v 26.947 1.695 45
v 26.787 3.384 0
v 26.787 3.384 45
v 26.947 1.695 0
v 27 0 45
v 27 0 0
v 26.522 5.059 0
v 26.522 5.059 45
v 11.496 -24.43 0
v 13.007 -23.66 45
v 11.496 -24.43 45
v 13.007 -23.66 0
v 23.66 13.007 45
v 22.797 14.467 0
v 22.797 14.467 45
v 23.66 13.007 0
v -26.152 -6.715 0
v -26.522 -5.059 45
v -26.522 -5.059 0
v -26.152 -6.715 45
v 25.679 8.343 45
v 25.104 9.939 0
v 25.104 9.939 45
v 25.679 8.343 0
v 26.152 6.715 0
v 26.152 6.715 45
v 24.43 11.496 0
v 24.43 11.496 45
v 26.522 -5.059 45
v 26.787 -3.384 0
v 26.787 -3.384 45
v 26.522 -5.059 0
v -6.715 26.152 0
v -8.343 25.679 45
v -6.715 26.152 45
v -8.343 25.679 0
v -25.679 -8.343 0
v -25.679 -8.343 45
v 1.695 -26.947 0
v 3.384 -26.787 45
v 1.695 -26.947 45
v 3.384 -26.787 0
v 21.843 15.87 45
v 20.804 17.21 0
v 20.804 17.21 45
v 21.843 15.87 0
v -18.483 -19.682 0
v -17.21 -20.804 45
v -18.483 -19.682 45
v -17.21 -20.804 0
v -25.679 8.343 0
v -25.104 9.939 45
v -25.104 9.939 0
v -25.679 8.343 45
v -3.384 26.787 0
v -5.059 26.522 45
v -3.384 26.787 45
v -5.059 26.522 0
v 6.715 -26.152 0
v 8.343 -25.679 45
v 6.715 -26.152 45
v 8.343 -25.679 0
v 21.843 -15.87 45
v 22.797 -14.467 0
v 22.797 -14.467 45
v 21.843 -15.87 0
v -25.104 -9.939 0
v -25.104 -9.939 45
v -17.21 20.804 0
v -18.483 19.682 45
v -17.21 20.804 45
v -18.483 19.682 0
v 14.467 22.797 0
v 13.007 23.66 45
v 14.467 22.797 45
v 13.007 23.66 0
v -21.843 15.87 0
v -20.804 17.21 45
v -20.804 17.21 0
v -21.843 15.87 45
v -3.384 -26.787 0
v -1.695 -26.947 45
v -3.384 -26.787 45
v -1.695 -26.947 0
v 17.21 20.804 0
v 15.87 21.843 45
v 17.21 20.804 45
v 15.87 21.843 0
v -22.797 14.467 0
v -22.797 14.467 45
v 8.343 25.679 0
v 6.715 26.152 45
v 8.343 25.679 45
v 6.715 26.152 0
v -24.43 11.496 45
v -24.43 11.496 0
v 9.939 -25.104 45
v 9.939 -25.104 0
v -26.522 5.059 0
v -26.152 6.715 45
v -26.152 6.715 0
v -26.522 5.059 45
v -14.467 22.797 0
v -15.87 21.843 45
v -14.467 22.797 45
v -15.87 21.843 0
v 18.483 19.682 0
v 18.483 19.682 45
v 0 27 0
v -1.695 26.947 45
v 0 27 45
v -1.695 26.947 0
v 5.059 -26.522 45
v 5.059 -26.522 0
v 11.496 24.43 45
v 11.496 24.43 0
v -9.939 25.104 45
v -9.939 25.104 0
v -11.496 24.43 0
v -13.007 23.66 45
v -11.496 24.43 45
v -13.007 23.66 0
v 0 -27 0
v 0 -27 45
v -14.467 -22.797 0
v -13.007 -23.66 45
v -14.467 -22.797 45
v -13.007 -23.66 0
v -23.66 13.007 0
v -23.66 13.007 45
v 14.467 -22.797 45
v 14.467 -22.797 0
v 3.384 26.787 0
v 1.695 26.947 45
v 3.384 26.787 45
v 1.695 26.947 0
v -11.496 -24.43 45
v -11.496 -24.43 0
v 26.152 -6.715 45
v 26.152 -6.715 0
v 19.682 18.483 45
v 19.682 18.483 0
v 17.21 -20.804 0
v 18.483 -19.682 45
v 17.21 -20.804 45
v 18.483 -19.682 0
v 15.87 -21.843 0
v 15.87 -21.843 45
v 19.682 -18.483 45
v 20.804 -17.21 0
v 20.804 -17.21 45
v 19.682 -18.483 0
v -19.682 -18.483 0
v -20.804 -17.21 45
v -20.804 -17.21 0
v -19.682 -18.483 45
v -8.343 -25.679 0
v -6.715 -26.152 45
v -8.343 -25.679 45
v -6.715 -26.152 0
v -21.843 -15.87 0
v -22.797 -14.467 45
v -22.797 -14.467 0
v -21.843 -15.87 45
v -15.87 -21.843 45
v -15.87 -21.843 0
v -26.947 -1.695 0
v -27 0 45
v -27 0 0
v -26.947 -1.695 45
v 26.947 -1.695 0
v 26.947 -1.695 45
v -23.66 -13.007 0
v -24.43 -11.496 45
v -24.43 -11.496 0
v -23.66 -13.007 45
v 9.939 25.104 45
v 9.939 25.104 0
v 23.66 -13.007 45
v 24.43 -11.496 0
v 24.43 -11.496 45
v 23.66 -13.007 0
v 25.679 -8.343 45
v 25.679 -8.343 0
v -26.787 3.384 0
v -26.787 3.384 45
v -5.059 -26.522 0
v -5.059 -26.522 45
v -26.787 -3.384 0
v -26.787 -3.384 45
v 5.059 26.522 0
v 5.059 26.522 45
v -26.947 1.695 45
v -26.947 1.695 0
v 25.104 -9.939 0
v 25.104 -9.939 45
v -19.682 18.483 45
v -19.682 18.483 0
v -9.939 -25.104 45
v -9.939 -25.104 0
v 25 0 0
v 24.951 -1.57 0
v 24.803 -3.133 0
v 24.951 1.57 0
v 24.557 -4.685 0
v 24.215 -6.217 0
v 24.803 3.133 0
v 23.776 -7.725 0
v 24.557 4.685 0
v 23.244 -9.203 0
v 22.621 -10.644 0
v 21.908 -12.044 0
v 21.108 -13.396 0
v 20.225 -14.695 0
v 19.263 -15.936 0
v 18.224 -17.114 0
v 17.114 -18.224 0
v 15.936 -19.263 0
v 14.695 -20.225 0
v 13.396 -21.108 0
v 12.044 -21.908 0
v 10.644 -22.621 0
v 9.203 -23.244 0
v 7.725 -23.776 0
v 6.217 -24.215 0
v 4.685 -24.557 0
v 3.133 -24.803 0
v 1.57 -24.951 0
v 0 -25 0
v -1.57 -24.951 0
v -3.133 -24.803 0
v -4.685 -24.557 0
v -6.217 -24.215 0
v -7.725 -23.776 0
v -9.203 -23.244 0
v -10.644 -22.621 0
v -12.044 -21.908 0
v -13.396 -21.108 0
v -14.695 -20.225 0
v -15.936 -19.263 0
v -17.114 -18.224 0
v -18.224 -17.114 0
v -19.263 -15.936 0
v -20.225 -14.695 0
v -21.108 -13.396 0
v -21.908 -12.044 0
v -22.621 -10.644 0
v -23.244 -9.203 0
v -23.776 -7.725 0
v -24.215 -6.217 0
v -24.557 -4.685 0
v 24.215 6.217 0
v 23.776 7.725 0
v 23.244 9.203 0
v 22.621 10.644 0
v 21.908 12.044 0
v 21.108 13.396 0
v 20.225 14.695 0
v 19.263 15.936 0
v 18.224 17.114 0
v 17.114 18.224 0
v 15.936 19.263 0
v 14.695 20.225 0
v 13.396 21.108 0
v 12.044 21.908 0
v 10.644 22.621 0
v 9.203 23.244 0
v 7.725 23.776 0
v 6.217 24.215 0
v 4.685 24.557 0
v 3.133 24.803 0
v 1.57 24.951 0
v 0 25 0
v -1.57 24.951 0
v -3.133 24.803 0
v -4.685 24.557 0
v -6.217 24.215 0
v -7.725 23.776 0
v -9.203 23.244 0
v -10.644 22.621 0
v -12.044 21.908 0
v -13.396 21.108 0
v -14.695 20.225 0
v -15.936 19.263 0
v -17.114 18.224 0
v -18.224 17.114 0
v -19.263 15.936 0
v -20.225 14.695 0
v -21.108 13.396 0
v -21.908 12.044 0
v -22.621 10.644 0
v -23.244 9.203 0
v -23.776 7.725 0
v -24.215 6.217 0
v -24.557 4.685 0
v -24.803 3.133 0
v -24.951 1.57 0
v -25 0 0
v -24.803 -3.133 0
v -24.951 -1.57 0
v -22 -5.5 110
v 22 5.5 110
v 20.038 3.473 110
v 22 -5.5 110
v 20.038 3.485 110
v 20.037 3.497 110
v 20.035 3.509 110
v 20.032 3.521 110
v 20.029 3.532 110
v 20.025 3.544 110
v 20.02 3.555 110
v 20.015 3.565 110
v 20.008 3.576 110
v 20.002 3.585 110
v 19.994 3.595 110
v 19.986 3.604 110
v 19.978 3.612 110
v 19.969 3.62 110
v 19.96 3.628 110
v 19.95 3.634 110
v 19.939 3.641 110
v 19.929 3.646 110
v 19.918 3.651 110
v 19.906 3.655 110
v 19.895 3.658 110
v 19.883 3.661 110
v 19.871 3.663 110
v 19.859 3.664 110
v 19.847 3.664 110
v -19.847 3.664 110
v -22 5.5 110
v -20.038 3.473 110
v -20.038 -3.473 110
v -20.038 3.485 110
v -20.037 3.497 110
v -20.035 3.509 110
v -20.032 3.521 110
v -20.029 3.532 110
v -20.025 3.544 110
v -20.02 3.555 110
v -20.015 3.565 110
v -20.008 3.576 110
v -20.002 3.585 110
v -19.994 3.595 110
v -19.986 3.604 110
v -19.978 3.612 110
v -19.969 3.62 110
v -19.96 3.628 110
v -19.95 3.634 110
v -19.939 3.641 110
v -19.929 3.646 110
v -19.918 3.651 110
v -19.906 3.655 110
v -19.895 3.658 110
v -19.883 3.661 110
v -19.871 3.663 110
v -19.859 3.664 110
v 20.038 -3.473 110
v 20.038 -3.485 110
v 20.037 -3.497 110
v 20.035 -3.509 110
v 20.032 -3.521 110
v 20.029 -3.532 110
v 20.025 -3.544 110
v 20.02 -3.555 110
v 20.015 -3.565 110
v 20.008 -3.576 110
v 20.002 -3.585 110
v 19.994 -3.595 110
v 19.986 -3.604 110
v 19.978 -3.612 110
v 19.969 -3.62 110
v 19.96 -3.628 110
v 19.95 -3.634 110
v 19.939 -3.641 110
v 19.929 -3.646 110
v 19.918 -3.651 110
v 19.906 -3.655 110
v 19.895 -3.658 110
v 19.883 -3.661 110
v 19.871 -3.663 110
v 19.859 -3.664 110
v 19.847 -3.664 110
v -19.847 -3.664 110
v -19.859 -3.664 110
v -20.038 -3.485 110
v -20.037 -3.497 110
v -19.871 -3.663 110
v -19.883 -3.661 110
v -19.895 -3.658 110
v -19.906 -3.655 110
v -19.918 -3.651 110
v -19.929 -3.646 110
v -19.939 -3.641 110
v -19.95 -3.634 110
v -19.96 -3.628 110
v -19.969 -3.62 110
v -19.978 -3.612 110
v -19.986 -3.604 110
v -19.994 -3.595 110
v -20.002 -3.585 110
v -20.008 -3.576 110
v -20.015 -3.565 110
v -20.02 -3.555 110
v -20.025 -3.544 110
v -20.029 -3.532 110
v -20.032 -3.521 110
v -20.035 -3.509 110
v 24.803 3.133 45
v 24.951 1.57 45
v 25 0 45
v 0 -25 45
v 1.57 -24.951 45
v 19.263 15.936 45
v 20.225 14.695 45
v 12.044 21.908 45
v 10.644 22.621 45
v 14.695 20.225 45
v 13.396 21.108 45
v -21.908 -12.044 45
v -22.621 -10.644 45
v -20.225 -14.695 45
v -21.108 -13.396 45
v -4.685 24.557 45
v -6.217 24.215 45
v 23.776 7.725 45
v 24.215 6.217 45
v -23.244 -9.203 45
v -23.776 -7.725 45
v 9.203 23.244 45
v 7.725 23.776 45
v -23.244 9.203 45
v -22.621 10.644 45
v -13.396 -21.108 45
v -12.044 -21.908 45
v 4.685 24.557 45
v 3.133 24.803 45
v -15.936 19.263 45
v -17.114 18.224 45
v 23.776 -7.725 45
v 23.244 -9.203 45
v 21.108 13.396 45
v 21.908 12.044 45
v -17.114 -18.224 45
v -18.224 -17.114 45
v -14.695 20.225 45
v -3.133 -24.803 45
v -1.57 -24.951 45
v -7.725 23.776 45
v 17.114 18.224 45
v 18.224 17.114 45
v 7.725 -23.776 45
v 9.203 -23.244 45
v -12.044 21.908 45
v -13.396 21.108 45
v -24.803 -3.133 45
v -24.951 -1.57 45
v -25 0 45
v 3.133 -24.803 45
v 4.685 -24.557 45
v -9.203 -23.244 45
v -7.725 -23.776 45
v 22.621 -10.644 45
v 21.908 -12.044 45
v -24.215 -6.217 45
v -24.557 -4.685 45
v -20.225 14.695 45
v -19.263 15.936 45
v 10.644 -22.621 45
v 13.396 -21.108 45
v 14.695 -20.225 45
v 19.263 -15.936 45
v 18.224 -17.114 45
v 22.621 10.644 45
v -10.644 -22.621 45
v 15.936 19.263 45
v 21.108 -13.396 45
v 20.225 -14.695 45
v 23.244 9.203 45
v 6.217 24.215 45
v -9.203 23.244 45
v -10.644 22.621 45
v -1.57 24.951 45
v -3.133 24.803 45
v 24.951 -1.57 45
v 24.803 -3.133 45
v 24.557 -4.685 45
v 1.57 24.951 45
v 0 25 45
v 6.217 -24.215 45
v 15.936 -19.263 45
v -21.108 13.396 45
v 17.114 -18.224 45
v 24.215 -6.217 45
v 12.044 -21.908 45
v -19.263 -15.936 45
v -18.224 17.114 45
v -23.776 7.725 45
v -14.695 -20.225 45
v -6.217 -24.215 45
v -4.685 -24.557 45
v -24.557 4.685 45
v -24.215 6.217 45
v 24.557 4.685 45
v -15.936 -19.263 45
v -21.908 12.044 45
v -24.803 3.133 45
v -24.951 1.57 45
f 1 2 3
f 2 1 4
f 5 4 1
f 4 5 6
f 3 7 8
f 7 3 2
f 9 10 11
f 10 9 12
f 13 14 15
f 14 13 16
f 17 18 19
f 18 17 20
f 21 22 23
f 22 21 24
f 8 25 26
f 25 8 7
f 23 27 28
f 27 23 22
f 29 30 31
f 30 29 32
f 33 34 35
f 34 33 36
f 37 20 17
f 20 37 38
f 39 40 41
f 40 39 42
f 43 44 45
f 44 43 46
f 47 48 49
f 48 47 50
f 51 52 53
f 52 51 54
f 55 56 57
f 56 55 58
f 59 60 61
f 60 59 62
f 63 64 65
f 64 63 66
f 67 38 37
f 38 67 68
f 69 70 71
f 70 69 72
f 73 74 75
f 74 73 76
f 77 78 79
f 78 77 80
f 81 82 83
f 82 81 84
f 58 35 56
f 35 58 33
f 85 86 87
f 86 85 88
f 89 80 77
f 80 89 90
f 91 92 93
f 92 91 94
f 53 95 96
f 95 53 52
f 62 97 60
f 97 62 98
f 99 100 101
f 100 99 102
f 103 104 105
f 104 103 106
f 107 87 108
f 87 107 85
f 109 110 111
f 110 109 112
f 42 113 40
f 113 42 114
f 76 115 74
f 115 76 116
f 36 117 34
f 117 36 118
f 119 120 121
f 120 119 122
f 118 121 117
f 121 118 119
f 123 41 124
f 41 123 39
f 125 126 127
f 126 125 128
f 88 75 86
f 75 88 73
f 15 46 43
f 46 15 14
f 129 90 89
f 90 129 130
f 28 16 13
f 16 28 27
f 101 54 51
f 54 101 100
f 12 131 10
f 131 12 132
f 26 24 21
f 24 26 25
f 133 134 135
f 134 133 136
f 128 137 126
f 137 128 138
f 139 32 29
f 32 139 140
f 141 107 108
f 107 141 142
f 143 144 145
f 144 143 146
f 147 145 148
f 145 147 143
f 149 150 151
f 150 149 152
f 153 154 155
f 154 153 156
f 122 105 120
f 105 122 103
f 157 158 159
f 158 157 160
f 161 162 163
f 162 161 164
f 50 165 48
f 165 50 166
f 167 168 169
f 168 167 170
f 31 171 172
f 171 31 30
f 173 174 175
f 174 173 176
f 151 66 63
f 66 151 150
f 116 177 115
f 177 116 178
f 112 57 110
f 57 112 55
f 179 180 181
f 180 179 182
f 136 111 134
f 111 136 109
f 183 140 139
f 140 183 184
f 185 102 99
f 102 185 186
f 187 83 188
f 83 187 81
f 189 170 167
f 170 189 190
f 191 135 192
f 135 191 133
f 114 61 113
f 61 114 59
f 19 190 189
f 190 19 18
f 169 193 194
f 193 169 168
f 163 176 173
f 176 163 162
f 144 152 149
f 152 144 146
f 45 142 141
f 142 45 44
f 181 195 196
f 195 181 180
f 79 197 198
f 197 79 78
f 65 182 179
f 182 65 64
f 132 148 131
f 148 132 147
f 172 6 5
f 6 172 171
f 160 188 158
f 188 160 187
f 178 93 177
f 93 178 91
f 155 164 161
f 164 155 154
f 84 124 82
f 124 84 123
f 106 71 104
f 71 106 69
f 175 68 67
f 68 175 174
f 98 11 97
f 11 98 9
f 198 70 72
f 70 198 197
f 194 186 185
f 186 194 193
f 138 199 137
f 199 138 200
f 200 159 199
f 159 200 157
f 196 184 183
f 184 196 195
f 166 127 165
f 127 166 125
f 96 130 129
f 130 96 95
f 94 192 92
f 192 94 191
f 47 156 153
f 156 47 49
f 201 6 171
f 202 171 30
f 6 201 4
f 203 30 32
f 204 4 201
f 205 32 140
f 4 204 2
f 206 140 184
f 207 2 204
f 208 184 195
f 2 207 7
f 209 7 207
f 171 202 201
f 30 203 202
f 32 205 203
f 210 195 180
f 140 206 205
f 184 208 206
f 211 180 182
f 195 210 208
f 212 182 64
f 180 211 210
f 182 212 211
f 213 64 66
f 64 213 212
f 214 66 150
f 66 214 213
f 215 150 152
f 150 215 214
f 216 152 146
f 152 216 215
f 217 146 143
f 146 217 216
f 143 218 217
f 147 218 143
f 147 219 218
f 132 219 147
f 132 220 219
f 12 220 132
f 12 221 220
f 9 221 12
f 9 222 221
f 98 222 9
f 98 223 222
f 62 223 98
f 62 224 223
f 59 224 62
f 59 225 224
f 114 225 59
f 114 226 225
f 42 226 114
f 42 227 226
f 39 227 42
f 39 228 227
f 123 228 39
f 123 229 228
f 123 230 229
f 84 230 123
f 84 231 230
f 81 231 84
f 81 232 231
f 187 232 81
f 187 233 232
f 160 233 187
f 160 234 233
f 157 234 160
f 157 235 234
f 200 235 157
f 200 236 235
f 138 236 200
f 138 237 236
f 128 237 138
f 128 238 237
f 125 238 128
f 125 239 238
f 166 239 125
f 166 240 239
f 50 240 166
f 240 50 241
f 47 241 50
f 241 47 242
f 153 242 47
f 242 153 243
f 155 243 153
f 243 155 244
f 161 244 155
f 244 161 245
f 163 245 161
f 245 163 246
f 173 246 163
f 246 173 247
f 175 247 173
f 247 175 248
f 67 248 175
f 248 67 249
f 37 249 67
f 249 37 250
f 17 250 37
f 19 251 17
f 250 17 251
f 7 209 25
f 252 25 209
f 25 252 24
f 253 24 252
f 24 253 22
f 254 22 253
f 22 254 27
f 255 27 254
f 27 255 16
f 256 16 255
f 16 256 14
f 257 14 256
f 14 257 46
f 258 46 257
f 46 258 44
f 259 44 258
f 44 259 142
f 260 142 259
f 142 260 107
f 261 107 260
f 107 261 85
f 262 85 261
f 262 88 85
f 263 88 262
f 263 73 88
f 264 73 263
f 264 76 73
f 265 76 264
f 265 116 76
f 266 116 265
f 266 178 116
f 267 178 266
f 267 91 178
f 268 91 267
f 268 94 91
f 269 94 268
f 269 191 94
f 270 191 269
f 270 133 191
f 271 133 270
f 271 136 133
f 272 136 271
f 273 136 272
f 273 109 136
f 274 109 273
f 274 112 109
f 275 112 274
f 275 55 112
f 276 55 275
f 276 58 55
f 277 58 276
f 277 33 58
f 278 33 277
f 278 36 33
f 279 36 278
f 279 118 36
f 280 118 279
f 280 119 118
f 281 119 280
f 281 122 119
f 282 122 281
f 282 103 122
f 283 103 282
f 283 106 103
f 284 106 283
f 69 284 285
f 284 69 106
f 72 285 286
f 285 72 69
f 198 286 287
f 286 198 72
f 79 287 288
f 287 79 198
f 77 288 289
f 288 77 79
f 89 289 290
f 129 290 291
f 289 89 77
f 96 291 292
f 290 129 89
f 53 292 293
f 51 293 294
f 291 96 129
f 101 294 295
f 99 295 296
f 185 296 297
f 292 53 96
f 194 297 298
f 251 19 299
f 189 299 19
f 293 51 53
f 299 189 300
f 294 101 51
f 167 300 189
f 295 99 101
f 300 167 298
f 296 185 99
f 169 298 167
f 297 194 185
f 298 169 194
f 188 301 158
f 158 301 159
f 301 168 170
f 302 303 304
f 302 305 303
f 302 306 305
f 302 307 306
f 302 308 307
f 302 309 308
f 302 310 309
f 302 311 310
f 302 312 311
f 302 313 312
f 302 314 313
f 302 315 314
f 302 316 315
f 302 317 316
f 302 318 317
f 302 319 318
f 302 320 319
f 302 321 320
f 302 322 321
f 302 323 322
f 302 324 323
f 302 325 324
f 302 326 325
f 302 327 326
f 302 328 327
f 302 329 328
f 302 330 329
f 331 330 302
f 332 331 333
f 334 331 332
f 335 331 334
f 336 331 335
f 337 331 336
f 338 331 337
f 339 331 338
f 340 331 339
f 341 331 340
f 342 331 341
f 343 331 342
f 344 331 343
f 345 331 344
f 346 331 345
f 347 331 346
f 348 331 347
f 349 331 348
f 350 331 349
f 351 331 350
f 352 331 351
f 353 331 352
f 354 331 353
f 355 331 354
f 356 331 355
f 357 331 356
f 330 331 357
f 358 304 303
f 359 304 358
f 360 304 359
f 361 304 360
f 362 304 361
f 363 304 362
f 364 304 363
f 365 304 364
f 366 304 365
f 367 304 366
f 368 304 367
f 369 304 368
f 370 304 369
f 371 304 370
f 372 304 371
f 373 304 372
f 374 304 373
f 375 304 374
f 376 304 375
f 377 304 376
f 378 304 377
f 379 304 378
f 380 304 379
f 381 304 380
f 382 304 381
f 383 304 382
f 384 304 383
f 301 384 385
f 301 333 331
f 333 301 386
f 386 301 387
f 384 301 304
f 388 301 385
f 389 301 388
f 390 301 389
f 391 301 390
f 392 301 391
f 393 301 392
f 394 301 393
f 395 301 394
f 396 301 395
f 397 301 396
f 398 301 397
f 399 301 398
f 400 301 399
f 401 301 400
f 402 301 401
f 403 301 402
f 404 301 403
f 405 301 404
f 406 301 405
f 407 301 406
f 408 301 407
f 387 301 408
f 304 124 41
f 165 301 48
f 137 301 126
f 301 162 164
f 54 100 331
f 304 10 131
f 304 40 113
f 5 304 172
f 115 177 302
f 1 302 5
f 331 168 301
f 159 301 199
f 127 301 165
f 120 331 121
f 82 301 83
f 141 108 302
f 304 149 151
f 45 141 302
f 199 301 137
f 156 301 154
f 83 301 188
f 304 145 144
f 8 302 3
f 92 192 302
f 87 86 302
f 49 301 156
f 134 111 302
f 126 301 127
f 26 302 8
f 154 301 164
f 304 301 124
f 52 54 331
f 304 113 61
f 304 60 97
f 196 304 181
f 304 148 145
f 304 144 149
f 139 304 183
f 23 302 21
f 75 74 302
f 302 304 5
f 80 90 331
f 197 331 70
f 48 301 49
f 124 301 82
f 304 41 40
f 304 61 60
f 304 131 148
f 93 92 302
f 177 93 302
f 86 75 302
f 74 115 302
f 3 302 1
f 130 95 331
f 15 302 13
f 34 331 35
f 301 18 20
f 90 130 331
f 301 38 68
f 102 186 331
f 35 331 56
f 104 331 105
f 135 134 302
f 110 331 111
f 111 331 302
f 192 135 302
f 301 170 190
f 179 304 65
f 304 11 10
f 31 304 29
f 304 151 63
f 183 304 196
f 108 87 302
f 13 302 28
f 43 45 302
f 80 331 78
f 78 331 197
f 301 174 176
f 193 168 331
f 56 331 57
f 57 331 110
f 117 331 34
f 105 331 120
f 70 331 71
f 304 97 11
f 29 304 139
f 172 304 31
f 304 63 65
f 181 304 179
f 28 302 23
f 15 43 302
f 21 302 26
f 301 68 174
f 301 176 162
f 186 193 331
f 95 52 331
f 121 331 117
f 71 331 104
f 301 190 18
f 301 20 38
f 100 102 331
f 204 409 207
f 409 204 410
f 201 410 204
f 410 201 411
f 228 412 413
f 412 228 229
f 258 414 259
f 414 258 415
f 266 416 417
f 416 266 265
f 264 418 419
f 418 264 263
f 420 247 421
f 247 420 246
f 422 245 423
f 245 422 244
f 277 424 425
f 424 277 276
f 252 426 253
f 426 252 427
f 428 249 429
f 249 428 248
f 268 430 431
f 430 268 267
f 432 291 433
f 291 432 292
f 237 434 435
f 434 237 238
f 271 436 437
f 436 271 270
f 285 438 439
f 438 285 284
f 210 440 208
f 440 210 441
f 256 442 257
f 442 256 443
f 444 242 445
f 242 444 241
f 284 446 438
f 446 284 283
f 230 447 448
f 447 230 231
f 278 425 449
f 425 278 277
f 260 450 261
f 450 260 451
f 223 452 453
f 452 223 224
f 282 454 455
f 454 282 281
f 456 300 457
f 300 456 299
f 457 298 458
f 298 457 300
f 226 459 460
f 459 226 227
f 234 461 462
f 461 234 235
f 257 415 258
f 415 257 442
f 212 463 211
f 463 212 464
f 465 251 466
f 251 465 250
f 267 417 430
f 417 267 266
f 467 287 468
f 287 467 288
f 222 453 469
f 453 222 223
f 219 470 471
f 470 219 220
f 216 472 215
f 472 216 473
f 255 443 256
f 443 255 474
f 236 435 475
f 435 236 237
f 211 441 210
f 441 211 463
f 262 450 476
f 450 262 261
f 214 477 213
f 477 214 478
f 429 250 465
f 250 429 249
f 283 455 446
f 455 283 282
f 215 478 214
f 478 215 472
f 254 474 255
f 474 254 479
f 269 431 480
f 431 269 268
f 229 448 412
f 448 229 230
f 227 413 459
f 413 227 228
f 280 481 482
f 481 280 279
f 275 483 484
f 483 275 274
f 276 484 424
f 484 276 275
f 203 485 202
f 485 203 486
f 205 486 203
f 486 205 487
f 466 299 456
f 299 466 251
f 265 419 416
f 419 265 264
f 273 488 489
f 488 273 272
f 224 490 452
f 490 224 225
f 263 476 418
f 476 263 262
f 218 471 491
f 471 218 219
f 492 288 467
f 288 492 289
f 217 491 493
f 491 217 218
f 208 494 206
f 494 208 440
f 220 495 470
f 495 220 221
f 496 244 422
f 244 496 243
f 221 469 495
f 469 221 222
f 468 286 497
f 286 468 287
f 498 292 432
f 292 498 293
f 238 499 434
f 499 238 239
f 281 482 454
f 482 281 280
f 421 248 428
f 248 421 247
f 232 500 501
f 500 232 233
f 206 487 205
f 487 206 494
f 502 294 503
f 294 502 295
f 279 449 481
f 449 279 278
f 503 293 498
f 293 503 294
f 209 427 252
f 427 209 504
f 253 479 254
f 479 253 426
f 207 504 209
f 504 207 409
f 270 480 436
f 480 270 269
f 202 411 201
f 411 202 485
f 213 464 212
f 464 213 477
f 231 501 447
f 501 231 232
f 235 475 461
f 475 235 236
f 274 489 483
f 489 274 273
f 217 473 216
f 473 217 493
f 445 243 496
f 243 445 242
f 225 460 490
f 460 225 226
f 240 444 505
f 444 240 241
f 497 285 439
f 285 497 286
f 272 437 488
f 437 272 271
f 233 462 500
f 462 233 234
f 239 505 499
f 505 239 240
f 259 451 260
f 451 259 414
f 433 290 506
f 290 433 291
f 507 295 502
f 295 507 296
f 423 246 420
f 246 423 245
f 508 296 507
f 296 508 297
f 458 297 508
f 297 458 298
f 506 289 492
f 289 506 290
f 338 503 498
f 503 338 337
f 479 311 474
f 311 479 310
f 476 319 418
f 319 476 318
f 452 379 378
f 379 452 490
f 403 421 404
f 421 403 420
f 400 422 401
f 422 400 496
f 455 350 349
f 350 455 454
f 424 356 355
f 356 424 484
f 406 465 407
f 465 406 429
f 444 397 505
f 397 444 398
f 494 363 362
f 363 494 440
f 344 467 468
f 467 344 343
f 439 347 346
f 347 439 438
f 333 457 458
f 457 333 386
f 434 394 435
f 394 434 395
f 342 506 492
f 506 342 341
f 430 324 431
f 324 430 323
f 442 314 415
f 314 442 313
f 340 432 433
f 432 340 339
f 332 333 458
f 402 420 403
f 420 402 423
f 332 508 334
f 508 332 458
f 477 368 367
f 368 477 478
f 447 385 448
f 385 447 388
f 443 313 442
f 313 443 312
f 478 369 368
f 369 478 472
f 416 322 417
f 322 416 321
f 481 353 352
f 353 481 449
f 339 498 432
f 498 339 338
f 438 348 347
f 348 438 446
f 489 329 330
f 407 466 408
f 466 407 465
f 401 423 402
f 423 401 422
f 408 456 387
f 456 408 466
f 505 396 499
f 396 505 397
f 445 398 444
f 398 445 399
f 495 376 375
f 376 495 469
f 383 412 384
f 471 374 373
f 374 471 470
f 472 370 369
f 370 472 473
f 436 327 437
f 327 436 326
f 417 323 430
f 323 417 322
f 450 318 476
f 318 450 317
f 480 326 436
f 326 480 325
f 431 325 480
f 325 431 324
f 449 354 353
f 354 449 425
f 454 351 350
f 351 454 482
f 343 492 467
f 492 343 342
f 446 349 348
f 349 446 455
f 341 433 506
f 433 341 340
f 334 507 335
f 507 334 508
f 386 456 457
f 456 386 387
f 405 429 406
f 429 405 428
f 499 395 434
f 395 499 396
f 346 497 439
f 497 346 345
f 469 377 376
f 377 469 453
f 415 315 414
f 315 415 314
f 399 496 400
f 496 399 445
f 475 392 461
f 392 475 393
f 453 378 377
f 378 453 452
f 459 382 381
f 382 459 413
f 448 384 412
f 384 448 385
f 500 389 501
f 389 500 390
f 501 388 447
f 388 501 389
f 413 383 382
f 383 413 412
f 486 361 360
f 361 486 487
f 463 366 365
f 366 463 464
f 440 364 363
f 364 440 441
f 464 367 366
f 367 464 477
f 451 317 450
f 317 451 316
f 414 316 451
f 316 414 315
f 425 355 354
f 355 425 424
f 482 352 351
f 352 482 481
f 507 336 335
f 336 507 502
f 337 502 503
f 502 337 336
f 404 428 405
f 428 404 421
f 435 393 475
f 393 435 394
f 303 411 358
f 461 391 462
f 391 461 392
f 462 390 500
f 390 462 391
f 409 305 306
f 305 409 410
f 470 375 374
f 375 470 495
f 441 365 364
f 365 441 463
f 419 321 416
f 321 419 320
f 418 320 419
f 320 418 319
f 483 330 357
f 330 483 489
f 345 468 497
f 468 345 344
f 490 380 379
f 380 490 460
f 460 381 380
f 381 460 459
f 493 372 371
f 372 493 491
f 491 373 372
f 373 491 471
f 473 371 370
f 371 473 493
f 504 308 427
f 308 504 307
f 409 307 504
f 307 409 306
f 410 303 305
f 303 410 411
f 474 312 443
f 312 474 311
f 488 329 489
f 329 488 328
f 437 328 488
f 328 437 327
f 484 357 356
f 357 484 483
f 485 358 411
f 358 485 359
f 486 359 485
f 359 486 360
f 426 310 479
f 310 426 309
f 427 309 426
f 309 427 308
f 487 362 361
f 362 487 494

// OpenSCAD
innerRadius = 25;
wallThickness = 2;
nozzleWidth = 40;
nozzleHeight = 7;

difference()
{
union()
{
    translate([0,0,0])cylinder(25, innerRadius+wallThickness, innerRadius+wallThickness, false, $fn = 100);
    
        hull()
        {
        translate([0,0,20])cylinder(25, innerRadius+wallThickness, innerRadius+wallThickness, false, $fn = 100);
        translate([0,0,90])cube([nozzleWidth+2*wallThickness, nozzleHeight+2*wallThickness, 40], true);
           
        }
}
union()
    {
    translate([0,0,-1])cylinder(26, innerRadius, innerRadius, false, $fn = 100);
        
        hull()
        {
        translate([0,0,19])cylinder(26, innerRadius, innerRadius, false, $fn = 100);
        translate([0,0,90])cube([nozzleWidth, nozzleHeight, 41], true);
           
        }
    }
}
